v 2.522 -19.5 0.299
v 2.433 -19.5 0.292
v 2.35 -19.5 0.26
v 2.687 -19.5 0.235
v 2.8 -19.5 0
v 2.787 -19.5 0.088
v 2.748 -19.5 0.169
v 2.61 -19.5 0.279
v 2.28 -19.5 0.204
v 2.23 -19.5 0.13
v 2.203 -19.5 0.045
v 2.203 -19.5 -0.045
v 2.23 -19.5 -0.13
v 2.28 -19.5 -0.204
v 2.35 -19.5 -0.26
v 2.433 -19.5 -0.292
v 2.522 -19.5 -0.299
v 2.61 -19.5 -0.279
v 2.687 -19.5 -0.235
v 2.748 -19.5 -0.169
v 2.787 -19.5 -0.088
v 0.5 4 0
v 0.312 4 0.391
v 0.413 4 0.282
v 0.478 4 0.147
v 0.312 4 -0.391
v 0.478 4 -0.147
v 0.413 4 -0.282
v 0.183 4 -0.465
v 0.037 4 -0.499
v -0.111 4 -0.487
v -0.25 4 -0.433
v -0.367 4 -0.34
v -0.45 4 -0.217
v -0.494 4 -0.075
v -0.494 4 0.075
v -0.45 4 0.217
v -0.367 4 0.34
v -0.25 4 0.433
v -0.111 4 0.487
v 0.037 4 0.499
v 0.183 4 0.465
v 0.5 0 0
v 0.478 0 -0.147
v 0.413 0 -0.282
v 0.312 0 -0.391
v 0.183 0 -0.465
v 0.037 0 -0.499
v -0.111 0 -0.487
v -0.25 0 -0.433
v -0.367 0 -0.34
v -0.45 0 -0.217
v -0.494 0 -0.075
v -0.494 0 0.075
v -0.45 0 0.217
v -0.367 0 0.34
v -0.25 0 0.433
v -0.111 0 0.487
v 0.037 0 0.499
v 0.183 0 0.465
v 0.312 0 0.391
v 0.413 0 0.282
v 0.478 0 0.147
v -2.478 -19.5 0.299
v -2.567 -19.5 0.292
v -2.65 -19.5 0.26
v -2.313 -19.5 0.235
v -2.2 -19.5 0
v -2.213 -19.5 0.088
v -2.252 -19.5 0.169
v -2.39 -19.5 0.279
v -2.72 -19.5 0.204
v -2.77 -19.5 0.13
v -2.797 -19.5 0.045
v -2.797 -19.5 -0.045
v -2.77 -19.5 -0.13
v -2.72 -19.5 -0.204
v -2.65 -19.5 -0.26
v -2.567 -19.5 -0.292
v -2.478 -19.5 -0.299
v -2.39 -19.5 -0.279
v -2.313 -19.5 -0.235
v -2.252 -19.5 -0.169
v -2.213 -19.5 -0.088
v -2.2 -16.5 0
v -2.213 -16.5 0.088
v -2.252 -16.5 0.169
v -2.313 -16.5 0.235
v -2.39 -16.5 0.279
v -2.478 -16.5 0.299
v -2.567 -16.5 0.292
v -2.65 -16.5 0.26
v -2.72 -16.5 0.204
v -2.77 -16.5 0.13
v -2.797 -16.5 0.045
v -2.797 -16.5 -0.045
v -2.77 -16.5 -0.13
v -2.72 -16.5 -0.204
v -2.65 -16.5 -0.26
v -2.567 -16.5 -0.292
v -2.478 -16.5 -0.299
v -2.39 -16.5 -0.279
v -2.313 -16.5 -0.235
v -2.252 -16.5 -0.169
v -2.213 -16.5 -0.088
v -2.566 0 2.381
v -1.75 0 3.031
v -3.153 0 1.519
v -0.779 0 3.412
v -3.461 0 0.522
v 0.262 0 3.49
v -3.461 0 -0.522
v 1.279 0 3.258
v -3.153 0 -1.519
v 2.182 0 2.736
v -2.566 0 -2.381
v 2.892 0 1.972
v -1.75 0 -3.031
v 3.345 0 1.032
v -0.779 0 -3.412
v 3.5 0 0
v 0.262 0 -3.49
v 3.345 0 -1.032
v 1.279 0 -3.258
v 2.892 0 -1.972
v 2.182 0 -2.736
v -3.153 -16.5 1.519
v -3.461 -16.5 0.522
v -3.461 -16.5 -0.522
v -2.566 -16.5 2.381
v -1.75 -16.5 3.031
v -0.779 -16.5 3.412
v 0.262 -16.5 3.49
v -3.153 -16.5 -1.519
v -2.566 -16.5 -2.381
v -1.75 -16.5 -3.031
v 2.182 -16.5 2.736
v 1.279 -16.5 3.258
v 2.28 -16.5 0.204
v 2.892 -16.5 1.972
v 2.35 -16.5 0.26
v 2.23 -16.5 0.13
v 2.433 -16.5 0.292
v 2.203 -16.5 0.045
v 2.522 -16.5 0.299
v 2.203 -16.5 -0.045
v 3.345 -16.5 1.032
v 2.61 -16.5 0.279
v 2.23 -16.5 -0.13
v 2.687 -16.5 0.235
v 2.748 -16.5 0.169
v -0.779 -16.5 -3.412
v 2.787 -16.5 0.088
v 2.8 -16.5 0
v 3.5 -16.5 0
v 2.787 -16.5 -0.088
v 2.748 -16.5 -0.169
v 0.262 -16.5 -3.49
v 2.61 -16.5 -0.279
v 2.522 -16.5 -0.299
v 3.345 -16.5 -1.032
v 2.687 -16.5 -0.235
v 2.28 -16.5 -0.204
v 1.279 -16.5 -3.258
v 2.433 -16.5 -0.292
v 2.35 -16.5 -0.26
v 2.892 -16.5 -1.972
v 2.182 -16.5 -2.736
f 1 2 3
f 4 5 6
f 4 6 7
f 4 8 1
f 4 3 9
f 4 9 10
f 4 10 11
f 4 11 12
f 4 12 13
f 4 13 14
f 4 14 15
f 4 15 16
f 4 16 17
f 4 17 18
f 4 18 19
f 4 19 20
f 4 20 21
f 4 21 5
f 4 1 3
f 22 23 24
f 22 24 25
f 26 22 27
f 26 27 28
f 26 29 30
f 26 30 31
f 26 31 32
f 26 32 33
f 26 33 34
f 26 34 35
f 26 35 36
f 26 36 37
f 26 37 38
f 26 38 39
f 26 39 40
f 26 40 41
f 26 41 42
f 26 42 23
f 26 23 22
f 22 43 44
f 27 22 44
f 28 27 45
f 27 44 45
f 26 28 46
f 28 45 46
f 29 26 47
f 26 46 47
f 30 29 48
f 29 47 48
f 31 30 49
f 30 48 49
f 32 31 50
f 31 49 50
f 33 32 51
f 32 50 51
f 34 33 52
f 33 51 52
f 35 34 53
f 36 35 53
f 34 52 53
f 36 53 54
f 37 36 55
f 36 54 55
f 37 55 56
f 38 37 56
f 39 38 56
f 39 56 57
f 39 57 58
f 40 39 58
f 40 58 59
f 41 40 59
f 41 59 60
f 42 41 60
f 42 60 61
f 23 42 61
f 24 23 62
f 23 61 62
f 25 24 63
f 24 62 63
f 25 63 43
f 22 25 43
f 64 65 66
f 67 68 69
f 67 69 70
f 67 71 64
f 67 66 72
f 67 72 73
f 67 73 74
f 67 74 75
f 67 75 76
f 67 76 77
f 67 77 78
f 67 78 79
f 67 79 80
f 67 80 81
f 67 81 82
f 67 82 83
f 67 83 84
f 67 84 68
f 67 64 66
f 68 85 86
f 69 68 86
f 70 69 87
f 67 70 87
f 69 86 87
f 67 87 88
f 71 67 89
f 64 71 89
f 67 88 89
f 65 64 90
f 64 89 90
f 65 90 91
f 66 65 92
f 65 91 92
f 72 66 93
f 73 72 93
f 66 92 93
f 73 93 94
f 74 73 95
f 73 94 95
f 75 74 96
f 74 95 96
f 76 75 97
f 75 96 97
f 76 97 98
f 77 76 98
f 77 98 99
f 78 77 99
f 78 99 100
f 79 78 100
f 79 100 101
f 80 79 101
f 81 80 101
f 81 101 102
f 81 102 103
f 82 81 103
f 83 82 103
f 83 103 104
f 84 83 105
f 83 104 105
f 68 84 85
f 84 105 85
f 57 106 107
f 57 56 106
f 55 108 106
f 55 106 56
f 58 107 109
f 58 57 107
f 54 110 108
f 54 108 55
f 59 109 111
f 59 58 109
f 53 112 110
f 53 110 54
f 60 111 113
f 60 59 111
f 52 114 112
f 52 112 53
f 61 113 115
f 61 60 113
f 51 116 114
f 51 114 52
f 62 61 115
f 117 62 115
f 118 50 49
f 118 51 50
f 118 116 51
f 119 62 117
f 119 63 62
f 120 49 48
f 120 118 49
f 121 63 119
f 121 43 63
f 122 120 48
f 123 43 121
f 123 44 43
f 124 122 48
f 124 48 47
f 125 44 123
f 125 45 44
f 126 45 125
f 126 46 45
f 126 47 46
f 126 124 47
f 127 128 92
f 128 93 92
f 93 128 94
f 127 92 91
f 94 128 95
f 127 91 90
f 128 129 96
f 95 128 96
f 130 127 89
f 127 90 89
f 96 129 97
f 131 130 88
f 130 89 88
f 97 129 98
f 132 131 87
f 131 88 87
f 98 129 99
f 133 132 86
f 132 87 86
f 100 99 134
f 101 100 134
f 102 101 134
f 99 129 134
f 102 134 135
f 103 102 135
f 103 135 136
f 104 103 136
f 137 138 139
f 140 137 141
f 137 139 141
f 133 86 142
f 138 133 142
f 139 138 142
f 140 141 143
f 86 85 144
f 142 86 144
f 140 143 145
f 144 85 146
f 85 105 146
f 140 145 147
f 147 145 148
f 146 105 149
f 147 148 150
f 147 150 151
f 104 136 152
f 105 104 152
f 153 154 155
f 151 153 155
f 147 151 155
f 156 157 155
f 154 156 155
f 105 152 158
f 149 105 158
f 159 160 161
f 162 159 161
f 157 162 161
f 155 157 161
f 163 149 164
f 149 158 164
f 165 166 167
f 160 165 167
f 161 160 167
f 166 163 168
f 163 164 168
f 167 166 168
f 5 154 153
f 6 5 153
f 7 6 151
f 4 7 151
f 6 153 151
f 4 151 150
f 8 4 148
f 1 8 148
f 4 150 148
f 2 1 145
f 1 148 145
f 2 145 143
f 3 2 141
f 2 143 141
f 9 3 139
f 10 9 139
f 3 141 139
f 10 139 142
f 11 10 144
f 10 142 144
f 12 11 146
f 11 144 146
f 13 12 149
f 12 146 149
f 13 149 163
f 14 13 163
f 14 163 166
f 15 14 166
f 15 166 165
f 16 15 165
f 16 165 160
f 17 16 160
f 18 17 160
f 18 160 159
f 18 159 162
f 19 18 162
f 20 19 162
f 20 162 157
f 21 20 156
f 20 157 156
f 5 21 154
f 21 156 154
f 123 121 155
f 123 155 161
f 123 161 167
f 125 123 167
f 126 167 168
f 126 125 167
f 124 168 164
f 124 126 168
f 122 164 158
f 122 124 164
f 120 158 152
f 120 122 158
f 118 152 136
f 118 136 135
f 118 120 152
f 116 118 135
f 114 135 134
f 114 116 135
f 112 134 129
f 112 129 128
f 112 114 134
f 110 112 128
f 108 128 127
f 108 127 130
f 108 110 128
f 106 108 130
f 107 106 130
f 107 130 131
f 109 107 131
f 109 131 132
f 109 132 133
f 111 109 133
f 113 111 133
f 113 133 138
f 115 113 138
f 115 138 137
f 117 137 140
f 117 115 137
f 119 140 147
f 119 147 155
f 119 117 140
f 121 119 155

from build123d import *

# Parameters (mm, degrees)
SKETCH1_R           = 3.5
BOSS_EXTRUDE1_DEPTH = 16.5
SKETCH2_R           = 0.5
BOSS_EXTRUDE2_DEPTH = 4
SKETCH3_R           = 0.3
BOSS_EXTRUDE3_DEPTH = 3


with BuildPart() as part:
    # Sketch1 → Boss-Extrude1 (new body)
    with BuildSketch(Plane(origin=(0, 0, 0), x_dir=(1, 0, 0), z_dir=(0, 1, 0))):
        Circle(SKETCH1_R)
    extrude(amount=-BOSS_EXTRUDE1_DEPTH)

    # Sketch2 → Boss-Extrude2 (add)
    with BuildSketch(Plane(origin=(0, 0, 0), x_dir=(1, 0, 0), z_dir=(0, 1, 0))):
        Circle(SKETCH2_R)
    extrude(amount=BOSS_EXTRUDE2_DEPTH)

    # Sketch3 → Boss-Extrude3 (add)
    with BuildSketch(Plane.XZ.offset(16.5)):
        with Locations((2.5, 0)):
            Circle(SKETCH3_R)
        with Locations((-2.5, 0)):
            Circle(SKETCH3_R)
    extrude(amount=BOSS_EXTRUDE3_DEPTH)


solid = part.part
